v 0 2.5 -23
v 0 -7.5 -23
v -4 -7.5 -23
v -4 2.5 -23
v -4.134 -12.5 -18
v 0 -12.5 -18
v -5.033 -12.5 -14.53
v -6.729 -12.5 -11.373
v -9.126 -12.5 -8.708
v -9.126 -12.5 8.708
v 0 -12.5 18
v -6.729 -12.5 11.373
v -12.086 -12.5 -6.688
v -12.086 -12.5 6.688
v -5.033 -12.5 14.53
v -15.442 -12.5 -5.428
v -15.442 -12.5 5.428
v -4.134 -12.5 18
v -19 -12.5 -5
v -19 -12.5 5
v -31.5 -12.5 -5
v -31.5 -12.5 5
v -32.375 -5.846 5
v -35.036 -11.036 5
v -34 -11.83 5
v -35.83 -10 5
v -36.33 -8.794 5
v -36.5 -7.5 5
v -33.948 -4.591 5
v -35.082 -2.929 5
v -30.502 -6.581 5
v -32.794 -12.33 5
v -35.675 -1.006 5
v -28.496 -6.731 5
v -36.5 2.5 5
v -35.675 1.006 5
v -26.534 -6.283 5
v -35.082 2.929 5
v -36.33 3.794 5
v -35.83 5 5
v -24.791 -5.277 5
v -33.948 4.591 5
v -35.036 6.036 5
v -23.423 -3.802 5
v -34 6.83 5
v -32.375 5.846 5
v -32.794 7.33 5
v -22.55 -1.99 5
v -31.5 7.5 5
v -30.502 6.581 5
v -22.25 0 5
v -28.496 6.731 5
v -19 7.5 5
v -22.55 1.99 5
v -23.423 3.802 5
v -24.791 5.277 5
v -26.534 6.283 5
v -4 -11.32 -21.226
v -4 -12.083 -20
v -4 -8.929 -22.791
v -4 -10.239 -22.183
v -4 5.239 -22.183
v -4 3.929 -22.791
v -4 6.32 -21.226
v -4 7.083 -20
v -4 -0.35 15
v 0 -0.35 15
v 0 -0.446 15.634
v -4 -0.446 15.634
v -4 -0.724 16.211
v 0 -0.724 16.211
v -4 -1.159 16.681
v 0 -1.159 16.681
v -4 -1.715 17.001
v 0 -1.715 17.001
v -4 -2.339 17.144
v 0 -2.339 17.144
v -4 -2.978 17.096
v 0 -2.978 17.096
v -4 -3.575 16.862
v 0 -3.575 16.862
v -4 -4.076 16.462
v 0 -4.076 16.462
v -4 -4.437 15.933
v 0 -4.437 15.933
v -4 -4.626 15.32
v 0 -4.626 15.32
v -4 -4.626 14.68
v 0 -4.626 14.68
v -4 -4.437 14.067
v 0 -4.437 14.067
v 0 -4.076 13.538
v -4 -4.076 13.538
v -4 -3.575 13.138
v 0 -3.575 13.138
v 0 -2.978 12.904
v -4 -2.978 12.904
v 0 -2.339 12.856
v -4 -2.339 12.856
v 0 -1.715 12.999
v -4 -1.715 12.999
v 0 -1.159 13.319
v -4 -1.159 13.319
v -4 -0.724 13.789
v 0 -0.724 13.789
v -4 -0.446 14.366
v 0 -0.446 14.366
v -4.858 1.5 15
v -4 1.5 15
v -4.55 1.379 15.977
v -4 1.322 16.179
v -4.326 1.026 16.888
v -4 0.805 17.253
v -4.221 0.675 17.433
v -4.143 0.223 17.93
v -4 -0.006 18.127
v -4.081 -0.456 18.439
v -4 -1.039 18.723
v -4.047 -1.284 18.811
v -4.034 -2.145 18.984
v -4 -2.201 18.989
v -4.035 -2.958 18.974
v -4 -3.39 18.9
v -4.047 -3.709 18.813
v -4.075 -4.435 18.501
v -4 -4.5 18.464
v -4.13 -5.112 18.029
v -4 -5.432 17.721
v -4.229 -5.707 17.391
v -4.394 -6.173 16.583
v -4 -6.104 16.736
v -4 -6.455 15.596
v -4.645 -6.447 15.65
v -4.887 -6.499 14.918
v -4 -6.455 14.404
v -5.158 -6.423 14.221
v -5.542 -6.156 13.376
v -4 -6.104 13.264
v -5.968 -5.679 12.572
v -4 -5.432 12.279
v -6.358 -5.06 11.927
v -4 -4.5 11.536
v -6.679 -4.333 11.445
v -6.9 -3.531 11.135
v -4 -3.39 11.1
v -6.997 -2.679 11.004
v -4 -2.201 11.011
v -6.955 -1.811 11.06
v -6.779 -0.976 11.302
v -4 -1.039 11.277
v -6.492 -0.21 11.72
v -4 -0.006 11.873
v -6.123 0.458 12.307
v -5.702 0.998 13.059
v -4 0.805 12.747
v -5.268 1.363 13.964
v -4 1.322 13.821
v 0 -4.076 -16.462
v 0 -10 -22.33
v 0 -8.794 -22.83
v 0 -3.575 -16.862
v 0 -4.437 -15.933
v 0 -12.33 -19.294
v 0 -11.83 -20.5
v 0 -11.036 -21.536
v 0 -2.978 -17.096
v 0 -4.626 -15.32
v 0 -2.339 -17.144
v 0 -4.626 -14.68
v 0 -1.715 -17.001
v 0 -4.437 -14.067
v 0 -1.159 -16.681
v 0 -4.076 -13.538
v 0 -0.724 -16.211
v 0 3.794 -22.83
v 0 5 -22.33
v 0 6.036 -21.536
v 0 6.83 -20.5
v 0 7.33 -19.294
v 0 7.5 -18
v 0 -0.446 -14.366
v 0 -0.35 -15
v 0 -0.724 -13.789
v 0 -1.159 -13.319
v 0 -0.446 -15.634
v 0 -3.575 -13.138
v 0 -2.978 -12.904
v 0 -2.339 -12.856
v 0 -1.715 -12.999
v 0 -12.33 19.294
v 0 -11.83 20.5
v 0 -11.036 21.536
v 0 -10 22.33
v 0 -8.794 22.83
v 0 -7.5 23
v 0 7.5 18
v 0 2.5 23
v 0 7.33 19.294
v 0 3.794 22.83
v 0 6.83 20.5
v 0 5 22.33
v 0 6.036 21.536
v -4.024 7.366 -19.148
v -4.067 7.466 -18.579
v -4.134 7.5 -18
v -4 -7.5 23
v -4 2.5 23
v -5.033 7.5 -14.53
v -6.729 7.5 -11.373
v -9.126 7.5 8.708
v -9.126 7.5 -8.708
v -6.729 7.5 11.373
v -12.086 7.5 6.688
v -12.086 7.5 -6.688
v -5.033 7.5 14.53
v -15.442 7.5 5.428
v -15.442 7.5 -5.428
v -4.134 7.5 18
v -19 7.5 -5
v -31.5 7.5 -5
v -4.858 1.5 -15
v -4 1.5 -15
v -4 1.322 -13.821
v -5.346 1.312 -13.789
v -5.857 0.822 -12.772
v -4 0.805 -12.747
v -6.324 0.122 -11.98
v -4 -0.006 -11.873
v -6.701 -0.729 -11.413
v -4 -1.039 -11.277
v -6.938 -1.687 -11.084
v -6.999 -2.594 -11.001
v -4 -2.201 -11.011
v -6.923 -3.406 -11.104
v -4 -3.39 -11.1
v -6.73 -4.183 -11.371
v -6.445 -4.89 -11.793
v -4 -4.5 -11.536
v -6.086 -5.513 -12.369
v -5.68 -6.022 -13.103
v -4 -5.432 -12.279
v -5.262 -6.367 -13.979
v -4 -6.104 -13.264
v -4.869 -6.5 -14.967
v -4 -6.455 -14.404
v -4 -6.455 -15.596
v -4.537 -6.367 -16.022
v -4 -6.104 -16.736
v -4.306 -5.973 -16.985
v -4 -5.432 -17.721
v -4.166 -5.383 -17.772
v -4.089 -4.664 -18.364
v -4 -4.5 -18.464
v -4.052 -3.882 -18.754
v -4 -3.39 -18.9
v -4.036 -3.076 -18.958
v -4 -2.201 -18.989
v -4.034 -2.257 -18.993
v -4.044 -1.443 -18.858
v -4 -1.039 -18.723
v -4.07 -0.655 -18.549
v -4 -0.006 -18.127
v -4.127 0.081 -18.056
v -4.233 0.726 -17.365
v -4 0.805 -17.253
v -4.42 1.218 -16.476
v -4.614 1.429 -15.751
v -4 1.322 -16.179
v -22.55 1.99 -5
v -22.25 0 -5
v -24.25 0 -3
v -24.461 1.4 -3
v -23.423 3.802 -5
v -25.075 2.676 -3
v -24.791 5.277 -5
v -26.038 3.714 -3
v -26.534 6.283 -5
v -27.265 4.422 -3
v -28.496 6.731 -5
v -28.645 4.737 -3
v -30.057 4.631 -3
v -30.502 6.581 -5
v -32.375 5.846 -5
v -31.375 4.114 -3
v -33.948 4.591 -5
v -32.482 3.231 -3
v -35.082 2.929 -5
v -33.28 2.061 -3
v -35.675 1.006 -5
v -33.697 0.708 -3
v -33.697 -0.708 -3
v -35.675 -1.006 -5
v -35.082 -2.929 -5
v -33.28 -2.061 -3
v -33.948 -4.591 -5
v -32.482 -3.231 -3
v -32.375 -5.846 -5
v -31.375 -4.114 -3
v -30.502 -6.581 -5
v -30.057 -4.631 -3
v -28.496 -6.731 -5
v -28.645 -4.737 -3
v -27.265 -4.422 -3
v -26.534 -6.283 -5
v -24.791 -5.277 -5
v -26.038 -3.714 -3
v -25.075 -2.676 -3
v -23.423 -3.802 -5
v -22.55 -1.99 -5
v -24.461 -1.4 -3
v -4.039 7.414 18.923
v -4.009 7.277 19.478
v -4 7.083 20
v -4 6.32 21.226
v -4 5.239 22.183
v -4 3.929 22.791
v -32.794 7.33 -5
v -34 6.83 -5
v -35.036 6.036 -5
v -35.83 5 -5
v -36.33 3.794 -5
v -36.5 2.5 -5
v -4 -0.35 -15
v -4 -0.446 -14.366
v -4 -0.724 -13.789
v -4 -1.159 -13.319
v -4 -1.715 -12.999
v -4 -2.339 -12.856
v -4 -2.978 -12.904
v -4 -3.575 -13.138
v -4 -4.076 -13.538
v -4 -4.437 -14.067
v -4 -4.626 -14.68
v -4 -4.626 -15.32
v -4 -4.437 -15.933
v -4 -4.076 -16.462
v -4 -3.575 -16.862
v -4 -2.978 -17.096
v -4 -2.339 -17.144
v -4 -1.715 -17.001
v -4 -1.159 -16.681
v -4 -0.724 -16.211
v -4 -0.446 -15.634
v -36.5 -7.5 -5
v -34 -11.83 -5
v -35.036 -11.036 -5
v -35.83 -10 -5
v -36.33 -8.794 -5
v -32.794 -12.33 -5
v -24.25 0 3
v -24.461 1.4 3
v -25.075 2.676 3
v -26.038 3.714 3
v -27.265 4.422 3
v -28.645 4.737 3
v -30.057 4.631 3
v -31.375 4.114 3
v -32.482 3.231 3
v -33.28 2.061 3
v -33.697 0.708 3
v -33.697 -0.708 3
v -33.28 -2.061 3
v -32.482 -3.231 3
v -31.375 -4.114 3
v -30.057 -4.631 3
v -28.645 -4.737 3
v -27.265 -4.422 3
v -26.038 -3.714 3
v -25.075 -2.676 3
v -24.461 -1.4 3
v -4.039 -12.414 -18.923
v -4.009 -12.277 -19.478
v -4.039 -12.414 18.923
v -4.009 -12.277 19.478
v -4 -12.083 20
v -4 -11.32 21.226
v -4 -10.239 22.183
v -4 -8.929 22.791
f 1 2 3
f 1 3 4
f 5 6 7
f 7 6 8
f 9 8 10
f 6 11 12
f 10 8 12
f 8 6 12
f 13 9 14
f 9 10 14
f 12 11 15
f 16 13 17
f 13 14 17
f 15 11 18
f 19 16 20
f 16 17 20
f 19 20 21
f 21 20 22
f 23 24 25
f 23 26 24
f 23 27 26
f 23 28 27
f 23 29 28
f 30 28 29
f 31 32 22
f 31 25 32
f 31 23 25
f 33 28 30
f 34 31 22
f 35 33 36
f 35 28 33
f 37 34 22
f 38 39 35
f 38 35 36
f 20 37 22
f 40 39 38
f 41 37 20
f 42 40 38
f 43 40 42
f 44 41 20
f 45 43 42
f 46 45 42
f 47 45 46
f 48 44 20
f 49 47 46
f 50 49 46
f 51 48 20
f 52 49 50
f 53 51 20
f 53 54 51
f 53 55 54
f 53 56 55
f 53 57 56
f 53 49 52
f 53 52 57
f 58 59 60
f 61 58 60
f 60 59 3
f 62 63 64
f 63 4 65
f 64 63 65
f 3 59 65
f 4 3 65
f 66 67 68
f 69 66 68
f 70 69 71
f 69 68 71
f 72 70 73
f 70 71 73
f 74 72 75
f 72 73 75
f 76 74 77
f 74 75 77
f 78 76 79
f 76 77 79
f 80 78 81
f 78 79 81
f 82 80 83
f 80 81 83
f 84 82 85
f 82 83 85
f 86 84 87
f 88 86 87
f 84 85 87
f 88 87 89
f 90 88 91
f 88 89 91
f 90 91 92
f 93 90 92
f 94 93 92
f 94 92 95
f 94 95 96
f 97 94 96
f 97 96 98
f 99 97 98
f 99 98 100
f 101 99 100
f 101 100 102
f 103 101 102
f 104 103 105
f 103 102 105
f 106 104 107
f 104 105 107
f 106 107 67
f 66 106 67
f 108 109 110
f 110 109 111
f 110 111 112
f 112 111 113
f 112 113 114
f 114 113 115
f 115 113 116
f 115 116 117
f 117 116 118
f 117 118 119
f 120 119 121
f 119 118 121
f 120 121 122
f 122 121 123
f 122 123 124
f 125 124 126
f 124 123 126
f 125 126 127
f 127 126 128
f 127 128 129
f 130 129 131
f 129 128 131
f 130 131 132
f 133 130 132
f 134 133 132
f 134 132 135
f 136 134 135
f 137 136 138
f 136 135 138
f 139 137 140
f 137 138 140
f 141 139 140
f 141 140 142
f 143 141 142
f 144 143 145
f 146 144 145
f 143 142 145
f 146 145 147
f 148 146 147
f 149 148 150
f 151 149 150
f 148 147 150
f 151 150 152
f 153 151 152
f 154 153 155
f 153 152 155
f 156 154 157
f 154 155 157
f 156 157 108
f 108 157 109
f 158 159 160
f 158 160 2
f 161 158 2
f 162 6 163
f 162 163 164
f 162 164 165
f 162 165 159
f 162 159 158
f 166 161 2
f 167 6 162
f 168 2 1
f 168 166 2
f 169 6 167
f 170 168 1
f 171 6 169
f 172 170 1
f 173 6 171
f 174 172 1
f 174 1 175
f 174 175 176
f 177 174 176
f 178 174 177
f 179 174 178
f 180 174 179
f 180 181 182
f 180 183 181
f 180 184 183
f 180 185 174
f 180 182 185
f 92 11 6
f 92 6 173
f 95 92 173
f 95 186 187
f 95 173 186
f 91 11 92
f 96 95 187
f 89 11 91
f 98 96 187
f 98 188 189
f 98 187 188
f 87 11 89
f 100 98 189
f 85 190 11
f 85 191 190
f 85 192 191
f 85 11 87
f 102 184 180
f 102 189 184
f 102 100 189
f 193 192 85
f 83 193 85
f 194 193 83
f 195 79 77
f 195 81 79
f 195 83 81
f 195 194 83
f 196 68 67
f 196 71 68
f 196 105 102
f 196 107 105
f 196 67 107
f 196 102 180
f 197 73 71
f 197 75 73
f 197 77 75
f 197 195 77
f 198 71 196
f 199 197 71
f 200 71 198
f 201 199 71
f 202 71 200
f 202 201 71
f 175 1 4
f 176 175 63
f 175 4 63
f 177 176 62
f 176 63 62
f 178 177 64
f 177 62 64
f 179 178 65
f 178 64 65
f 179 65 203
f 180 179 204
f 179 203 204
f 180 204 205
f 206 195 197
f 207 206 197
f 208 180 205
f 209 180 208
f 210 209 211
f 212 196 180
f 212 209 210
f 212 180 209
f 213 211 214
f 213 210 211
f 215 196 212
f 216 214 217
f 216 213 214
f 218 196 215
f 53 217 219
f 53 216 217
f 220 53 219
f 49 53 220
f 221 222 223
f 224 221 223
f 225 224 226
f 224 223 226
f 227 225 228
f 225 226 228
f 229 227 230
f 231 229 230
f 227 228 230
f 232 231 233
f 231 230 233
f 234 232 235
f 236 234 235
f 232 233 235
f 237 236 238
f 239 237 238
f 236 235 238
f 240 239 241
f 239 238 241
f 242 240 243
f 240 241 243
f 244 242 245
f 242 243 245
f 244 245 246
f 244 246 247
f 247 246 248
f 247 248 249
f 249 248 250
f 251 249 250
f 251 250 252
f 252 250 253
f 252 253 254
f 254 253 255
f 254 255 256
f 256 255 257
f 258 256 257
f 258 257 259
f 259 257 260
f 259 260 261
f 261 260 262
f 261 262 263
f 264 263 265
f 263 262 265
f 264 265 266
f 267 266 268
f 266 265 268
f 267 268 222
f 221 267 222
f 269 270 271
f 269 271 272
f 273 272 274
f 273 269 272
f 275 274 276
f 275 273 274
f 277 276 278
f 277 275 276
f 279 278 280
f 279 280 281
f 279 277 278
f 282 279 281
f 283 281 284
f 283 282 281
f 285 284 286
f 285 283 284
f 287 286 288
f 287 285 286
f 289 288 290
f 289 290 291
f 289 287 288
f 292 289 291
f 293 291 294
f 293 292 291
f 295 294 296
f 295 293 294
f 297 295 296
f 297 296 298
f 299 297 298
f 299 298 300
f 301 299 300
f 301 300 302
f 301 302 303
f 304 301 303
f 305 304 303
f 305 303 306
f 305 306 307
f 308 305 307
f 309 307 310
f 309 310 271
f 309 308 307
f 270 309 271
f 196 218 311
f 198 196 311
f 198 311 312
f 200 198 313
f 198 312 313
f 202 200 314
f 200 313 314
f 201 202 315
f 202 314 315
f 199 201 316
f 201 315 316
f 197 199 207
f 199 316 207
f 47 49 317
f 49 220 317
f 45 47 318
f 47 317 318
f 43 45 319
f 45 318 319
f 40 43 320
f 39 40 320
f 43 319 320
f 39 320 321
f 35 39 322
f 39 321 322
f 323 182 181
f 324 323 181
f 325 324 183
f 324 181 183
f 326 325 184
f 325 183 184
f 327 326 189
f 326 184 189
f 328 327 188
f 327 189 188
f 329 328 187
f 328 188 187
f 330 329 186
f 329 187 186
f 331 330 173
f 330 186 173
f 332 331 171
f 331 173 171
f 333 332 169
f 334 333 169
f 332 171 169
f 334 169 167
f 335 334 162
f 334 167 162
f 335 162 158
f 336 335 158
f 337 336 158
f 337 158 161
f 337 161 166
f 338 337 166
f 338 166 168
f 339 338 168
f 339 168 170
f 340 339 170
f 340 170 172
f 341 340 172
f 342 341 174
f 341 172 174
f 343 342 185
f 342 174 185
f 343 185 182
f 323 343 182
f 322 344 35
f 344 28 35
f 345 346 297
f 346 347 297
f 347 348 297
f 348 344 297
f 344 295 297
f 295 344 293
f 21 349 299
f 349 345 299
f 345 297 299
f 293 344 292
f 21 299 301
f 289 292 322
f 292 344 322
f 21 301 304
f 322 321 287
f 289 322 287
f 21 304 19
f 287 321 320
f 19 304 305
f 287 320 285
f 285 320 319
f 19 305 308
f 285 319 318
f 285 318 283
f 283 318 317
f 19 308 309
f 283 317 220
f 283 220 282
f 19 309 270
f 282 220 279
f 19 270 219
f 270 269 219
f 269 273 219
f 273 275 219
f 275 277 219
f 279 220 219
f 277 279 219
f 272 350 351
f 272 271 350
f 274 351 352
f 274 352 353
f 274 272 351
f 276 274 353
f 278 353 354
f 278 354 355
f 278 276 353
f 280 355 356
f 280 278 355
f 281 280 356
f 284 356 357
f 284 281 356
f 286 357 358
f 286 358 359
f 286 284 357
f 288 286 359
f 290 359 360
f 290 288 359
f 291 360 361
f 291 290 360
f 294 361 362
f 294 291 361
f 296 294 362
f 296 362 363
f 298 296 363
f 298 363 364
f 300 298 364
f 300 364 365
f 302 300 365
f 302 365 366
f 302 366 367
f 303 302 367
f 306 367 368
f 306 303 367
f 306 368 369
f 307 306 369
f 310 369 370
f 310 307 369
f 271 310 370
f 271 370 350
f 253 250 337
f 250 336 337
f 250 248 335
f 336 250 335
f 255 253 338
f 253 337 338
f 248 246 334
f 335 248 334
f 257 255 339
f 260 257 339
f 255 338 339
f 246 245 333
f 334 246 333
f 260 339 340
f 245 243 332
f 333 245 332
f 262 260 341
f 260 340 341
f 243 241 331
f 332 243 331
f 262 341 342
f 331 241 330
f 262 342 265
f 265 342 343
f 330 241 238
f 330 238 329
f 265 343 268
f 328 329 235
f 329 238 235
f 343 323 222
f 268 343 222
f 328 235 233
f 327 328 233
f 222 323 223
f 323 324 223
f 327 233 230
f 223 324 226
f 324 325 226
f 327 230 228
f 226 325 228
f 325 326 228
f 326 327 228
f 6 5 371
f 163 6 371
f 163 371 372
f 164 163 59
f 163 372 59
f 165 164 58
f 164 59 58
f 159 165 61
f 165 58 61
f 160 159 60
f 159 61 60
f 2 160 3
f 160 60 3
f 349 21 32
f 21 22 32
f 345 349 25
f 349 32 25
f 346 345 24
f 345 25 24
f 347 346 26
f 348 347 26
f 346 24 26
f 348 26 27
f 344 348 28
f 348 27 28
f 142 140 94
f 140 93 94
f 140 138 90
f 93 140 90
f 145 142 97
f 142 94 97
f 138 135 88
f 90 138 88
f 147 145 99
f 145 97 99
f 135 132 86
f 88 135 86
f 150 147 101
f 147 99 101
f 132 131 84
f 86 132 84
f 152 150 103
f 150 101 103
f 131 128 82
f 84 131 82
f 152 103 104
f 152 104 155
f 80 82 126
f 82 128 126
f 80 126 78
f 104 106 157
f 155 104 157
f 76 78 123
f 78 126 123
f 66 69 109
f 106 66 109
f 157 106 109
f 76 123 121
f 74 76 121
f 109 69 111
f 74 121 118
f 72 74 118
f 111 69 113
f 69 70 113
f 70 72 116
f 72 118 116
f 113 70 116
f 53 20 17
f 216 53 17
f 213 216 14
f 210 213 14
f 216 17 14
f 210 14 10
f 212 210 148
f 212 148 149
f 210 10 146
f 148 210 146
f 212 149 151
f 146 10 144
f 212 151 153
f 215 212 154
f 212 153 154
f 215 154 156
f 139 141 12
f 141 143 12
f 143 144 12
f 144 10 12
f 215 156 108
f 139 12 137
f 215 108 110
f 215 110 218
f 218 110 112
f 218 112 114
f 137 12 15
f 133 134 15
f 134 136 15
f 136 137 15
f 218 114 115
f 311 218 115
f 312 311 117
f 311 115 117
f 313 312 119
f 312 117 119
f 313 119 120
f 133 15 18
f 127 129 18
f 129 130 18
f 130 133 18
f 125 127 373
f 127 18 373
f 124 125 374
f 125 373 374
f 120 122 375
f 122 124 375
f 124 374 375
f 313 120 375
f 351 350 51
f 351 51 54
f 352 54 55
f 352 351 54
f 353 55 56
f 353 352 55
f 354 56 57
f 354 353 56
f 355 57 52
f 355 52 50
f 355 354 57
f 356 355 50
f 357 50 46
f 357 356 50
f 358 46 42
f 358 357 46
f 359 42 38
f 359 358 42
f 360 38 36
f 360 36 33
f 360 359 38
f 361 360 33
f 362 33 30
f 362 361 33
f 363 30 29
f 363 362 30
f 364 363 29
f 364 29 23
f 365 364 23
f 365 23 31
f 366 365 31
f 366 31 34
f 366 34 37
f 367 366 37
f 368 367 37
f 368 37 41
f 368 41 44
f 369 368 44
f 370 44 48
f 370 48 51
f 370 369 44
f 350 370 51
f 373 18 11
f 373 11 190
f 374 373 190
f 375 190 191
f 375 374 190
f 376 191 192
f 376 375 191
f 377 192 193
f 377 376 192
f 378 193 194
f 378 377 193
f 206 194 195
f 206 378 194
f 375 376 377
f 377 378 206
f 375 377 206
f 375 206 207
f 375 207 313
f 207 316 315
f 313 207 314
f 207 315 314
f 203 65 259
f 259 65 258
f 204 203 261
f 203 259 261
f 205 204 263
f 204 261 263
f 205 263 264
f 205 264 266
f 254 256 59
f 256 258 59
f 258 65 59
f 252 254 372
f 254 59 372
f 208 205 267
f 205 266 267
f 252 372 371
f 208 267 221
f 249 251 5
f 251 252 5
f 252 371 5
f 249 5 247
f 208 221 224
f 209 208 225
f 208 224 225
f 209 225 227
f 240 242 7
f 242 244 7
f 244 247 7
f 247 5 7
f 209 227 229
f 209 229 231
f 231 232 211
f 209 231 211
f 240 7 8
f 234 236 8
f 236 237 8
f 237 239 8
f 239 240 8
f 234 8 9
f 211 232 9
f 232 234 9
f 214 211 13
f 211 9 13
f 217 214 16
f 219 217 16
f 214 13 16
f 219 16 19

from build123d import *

# Parameters (mm, degrees)
F0_W          = 36.5
F0_H          = 20
F0_R          = 4.75
F1_DEPTH      = 5
F1_DEPTH_BACK = 5
F2_SIZE       = 2
F3_W          = 20
F3_H          = 46
F3_R          = 4
F4_DEPTH      = 4
F5_T4_DEPTH   = 20
F5_S5_R       = 4
F5_T6_DEPTH   = 16
F5_T10_DEPTH  = 20
F5_S11_R      = 4
F5_T12_DEPTH  = 16
F3_R_2        = 2.15
F6_DEPTH      = 4
F7_R          = 5
F8_R          = 5


# Not quite as in the source:
# - a fillet or chamfer that OpenCascade refuses, or shapes differently, is made with other operations: its cross-section is extruded or revolved along the edge and cut away or added


with BuildPart() as f1:
    # F0 (on Top) → F1 (new body, two sides)
    with BuildSketch(Plane.XY) as f1_sk:
        with Locations((-18.25, -2.5)):
            Rectangle(F0_W, F0_H)
        with Locations((-29, 0)):
            Circle(F0_R, mode=Mode.SUBTRACT)
    extrude(amount=F1_DEPTH)
    extrude(f1_sk.sketch, amount=-F1_DEPTH_BACK)

    # F2
    f2_edges = [f1.edges().sort_by_distance(p)[0] for p in [
        (-33.75, 0, 5),
        (-33.75, 0, -5),
    ]]
    chamfer(f2_edges, length=F2_SIZE)

    # F3 (on Right) → F4 (join)
    with BuildSketch(Plane.YZ):
        with Locations((-2.5, 0)):
            Rectangle(F3_W, F3_H)
        with Locations((-2.5, -15)):
            Circle(F3_R, mode=Mode.SUBTRACT)
        with Locations((-2.5, 15)):
            Circle(F3_R, mode=Mode.SUBTRACT)
    extrude(amount=-F4_DEPTH)

    # F5: fillet of radius 15 on 2 edges, made by hand


with BuildPart() as f5_tool2:
    # F5_s3 → F5_t4 (new body)
    with BuildSketch(Plane.XZ.offset(12.5)):
        with BuildLine():
            ThreePointArc((-19, 5), (-8.3933982822, 9.3933982822), (-4, 20))
            Line((-4, 20), (-4, 5))
            Line((-4, 5), (-19, 5))
        make_face()
    extrude(amount=-F5_T4_DEPTH)

    # F5_s5 → F5_t6 (cut, symmetric)
    with BuildSketch(Plane.YZ.offset(-11.5)):
        with Locations((-2.5, 15)):
            Circle(F5_S5_R)
    extrude(amount=F5_T6_DEPTH, both=True, mode=Mode.SUBTRACT)


with BuildPart() as f1_1:
    add(f1.part)

    # F5_t1: union F5_tool2
    add(f5_tool2.part)


with BuildPart() as f5_tool8:
    # F5_s9 → F5_t10 (new body)
    with BuildSketch(Plane.XZ.offset(12.5)):
        with BuildLine():
            ThreePointArc((-4, -20), (-8.3933982822, -9.3933982822), (-19, -5))
            Line((-19, -5), (-4, -5))
            Line((-4, -5), (-4, -20))
        make_face()
    extrude(amount=-F5_T10_DEPTH)

    # F5_s11 → F5_t12 (cut, symmetric)
    with BuildSketch(Plane.YZ.offset(-11.5)):
        with Locations((-2.5, -15)):
            Circle(F5_S11_R)
    extrude(amount=F5_T12_DEPTH, both=True, mode=Mode.SUBTRACT)


with BuildPart() as f1_2:
    add(f1_1.part)

    # F5_t7: union F5_tool8
    add(f5_tool8.part)

    # F3 (on Right) → F6 (join)
    with BuildSketch(Plane.YZ):
        with Locations((-2.5, 15)):
            Circle(F3_R)
        with Locations((-2.5, 15)):
            Circle(F3_R_2, mode=Mode.SUBTRACT)
        with Locations((-2.5, -15)):
            Circle(F3_R)
        with Locations((-2.5, -15)):
            Circle(F3_R_2, mode=Mode.SUBTRACT)
    extrude(amount=-F6_DEPTH)

    # F7
    f7_edges = [f1_2.edges().sort_by_distance(p)[0] for p in [
        (-2, -12.5, -23),
        (-2, -12.5, 23),
        (-2, 7.5, -23),
        (-2, 7.5, 23),
    ]]
    fillet(f7_edges, radius=F7_R)

    # F8
    f8_edges = [f1_2.edges().sort_by_distance(p)[0] for p in [
        (-36.5, -12.5, 0),
        (-36.5, 7.5, 0),
    ]]
    fillet(f8_edges, radius=F8_R)


solid = f1_2.part
